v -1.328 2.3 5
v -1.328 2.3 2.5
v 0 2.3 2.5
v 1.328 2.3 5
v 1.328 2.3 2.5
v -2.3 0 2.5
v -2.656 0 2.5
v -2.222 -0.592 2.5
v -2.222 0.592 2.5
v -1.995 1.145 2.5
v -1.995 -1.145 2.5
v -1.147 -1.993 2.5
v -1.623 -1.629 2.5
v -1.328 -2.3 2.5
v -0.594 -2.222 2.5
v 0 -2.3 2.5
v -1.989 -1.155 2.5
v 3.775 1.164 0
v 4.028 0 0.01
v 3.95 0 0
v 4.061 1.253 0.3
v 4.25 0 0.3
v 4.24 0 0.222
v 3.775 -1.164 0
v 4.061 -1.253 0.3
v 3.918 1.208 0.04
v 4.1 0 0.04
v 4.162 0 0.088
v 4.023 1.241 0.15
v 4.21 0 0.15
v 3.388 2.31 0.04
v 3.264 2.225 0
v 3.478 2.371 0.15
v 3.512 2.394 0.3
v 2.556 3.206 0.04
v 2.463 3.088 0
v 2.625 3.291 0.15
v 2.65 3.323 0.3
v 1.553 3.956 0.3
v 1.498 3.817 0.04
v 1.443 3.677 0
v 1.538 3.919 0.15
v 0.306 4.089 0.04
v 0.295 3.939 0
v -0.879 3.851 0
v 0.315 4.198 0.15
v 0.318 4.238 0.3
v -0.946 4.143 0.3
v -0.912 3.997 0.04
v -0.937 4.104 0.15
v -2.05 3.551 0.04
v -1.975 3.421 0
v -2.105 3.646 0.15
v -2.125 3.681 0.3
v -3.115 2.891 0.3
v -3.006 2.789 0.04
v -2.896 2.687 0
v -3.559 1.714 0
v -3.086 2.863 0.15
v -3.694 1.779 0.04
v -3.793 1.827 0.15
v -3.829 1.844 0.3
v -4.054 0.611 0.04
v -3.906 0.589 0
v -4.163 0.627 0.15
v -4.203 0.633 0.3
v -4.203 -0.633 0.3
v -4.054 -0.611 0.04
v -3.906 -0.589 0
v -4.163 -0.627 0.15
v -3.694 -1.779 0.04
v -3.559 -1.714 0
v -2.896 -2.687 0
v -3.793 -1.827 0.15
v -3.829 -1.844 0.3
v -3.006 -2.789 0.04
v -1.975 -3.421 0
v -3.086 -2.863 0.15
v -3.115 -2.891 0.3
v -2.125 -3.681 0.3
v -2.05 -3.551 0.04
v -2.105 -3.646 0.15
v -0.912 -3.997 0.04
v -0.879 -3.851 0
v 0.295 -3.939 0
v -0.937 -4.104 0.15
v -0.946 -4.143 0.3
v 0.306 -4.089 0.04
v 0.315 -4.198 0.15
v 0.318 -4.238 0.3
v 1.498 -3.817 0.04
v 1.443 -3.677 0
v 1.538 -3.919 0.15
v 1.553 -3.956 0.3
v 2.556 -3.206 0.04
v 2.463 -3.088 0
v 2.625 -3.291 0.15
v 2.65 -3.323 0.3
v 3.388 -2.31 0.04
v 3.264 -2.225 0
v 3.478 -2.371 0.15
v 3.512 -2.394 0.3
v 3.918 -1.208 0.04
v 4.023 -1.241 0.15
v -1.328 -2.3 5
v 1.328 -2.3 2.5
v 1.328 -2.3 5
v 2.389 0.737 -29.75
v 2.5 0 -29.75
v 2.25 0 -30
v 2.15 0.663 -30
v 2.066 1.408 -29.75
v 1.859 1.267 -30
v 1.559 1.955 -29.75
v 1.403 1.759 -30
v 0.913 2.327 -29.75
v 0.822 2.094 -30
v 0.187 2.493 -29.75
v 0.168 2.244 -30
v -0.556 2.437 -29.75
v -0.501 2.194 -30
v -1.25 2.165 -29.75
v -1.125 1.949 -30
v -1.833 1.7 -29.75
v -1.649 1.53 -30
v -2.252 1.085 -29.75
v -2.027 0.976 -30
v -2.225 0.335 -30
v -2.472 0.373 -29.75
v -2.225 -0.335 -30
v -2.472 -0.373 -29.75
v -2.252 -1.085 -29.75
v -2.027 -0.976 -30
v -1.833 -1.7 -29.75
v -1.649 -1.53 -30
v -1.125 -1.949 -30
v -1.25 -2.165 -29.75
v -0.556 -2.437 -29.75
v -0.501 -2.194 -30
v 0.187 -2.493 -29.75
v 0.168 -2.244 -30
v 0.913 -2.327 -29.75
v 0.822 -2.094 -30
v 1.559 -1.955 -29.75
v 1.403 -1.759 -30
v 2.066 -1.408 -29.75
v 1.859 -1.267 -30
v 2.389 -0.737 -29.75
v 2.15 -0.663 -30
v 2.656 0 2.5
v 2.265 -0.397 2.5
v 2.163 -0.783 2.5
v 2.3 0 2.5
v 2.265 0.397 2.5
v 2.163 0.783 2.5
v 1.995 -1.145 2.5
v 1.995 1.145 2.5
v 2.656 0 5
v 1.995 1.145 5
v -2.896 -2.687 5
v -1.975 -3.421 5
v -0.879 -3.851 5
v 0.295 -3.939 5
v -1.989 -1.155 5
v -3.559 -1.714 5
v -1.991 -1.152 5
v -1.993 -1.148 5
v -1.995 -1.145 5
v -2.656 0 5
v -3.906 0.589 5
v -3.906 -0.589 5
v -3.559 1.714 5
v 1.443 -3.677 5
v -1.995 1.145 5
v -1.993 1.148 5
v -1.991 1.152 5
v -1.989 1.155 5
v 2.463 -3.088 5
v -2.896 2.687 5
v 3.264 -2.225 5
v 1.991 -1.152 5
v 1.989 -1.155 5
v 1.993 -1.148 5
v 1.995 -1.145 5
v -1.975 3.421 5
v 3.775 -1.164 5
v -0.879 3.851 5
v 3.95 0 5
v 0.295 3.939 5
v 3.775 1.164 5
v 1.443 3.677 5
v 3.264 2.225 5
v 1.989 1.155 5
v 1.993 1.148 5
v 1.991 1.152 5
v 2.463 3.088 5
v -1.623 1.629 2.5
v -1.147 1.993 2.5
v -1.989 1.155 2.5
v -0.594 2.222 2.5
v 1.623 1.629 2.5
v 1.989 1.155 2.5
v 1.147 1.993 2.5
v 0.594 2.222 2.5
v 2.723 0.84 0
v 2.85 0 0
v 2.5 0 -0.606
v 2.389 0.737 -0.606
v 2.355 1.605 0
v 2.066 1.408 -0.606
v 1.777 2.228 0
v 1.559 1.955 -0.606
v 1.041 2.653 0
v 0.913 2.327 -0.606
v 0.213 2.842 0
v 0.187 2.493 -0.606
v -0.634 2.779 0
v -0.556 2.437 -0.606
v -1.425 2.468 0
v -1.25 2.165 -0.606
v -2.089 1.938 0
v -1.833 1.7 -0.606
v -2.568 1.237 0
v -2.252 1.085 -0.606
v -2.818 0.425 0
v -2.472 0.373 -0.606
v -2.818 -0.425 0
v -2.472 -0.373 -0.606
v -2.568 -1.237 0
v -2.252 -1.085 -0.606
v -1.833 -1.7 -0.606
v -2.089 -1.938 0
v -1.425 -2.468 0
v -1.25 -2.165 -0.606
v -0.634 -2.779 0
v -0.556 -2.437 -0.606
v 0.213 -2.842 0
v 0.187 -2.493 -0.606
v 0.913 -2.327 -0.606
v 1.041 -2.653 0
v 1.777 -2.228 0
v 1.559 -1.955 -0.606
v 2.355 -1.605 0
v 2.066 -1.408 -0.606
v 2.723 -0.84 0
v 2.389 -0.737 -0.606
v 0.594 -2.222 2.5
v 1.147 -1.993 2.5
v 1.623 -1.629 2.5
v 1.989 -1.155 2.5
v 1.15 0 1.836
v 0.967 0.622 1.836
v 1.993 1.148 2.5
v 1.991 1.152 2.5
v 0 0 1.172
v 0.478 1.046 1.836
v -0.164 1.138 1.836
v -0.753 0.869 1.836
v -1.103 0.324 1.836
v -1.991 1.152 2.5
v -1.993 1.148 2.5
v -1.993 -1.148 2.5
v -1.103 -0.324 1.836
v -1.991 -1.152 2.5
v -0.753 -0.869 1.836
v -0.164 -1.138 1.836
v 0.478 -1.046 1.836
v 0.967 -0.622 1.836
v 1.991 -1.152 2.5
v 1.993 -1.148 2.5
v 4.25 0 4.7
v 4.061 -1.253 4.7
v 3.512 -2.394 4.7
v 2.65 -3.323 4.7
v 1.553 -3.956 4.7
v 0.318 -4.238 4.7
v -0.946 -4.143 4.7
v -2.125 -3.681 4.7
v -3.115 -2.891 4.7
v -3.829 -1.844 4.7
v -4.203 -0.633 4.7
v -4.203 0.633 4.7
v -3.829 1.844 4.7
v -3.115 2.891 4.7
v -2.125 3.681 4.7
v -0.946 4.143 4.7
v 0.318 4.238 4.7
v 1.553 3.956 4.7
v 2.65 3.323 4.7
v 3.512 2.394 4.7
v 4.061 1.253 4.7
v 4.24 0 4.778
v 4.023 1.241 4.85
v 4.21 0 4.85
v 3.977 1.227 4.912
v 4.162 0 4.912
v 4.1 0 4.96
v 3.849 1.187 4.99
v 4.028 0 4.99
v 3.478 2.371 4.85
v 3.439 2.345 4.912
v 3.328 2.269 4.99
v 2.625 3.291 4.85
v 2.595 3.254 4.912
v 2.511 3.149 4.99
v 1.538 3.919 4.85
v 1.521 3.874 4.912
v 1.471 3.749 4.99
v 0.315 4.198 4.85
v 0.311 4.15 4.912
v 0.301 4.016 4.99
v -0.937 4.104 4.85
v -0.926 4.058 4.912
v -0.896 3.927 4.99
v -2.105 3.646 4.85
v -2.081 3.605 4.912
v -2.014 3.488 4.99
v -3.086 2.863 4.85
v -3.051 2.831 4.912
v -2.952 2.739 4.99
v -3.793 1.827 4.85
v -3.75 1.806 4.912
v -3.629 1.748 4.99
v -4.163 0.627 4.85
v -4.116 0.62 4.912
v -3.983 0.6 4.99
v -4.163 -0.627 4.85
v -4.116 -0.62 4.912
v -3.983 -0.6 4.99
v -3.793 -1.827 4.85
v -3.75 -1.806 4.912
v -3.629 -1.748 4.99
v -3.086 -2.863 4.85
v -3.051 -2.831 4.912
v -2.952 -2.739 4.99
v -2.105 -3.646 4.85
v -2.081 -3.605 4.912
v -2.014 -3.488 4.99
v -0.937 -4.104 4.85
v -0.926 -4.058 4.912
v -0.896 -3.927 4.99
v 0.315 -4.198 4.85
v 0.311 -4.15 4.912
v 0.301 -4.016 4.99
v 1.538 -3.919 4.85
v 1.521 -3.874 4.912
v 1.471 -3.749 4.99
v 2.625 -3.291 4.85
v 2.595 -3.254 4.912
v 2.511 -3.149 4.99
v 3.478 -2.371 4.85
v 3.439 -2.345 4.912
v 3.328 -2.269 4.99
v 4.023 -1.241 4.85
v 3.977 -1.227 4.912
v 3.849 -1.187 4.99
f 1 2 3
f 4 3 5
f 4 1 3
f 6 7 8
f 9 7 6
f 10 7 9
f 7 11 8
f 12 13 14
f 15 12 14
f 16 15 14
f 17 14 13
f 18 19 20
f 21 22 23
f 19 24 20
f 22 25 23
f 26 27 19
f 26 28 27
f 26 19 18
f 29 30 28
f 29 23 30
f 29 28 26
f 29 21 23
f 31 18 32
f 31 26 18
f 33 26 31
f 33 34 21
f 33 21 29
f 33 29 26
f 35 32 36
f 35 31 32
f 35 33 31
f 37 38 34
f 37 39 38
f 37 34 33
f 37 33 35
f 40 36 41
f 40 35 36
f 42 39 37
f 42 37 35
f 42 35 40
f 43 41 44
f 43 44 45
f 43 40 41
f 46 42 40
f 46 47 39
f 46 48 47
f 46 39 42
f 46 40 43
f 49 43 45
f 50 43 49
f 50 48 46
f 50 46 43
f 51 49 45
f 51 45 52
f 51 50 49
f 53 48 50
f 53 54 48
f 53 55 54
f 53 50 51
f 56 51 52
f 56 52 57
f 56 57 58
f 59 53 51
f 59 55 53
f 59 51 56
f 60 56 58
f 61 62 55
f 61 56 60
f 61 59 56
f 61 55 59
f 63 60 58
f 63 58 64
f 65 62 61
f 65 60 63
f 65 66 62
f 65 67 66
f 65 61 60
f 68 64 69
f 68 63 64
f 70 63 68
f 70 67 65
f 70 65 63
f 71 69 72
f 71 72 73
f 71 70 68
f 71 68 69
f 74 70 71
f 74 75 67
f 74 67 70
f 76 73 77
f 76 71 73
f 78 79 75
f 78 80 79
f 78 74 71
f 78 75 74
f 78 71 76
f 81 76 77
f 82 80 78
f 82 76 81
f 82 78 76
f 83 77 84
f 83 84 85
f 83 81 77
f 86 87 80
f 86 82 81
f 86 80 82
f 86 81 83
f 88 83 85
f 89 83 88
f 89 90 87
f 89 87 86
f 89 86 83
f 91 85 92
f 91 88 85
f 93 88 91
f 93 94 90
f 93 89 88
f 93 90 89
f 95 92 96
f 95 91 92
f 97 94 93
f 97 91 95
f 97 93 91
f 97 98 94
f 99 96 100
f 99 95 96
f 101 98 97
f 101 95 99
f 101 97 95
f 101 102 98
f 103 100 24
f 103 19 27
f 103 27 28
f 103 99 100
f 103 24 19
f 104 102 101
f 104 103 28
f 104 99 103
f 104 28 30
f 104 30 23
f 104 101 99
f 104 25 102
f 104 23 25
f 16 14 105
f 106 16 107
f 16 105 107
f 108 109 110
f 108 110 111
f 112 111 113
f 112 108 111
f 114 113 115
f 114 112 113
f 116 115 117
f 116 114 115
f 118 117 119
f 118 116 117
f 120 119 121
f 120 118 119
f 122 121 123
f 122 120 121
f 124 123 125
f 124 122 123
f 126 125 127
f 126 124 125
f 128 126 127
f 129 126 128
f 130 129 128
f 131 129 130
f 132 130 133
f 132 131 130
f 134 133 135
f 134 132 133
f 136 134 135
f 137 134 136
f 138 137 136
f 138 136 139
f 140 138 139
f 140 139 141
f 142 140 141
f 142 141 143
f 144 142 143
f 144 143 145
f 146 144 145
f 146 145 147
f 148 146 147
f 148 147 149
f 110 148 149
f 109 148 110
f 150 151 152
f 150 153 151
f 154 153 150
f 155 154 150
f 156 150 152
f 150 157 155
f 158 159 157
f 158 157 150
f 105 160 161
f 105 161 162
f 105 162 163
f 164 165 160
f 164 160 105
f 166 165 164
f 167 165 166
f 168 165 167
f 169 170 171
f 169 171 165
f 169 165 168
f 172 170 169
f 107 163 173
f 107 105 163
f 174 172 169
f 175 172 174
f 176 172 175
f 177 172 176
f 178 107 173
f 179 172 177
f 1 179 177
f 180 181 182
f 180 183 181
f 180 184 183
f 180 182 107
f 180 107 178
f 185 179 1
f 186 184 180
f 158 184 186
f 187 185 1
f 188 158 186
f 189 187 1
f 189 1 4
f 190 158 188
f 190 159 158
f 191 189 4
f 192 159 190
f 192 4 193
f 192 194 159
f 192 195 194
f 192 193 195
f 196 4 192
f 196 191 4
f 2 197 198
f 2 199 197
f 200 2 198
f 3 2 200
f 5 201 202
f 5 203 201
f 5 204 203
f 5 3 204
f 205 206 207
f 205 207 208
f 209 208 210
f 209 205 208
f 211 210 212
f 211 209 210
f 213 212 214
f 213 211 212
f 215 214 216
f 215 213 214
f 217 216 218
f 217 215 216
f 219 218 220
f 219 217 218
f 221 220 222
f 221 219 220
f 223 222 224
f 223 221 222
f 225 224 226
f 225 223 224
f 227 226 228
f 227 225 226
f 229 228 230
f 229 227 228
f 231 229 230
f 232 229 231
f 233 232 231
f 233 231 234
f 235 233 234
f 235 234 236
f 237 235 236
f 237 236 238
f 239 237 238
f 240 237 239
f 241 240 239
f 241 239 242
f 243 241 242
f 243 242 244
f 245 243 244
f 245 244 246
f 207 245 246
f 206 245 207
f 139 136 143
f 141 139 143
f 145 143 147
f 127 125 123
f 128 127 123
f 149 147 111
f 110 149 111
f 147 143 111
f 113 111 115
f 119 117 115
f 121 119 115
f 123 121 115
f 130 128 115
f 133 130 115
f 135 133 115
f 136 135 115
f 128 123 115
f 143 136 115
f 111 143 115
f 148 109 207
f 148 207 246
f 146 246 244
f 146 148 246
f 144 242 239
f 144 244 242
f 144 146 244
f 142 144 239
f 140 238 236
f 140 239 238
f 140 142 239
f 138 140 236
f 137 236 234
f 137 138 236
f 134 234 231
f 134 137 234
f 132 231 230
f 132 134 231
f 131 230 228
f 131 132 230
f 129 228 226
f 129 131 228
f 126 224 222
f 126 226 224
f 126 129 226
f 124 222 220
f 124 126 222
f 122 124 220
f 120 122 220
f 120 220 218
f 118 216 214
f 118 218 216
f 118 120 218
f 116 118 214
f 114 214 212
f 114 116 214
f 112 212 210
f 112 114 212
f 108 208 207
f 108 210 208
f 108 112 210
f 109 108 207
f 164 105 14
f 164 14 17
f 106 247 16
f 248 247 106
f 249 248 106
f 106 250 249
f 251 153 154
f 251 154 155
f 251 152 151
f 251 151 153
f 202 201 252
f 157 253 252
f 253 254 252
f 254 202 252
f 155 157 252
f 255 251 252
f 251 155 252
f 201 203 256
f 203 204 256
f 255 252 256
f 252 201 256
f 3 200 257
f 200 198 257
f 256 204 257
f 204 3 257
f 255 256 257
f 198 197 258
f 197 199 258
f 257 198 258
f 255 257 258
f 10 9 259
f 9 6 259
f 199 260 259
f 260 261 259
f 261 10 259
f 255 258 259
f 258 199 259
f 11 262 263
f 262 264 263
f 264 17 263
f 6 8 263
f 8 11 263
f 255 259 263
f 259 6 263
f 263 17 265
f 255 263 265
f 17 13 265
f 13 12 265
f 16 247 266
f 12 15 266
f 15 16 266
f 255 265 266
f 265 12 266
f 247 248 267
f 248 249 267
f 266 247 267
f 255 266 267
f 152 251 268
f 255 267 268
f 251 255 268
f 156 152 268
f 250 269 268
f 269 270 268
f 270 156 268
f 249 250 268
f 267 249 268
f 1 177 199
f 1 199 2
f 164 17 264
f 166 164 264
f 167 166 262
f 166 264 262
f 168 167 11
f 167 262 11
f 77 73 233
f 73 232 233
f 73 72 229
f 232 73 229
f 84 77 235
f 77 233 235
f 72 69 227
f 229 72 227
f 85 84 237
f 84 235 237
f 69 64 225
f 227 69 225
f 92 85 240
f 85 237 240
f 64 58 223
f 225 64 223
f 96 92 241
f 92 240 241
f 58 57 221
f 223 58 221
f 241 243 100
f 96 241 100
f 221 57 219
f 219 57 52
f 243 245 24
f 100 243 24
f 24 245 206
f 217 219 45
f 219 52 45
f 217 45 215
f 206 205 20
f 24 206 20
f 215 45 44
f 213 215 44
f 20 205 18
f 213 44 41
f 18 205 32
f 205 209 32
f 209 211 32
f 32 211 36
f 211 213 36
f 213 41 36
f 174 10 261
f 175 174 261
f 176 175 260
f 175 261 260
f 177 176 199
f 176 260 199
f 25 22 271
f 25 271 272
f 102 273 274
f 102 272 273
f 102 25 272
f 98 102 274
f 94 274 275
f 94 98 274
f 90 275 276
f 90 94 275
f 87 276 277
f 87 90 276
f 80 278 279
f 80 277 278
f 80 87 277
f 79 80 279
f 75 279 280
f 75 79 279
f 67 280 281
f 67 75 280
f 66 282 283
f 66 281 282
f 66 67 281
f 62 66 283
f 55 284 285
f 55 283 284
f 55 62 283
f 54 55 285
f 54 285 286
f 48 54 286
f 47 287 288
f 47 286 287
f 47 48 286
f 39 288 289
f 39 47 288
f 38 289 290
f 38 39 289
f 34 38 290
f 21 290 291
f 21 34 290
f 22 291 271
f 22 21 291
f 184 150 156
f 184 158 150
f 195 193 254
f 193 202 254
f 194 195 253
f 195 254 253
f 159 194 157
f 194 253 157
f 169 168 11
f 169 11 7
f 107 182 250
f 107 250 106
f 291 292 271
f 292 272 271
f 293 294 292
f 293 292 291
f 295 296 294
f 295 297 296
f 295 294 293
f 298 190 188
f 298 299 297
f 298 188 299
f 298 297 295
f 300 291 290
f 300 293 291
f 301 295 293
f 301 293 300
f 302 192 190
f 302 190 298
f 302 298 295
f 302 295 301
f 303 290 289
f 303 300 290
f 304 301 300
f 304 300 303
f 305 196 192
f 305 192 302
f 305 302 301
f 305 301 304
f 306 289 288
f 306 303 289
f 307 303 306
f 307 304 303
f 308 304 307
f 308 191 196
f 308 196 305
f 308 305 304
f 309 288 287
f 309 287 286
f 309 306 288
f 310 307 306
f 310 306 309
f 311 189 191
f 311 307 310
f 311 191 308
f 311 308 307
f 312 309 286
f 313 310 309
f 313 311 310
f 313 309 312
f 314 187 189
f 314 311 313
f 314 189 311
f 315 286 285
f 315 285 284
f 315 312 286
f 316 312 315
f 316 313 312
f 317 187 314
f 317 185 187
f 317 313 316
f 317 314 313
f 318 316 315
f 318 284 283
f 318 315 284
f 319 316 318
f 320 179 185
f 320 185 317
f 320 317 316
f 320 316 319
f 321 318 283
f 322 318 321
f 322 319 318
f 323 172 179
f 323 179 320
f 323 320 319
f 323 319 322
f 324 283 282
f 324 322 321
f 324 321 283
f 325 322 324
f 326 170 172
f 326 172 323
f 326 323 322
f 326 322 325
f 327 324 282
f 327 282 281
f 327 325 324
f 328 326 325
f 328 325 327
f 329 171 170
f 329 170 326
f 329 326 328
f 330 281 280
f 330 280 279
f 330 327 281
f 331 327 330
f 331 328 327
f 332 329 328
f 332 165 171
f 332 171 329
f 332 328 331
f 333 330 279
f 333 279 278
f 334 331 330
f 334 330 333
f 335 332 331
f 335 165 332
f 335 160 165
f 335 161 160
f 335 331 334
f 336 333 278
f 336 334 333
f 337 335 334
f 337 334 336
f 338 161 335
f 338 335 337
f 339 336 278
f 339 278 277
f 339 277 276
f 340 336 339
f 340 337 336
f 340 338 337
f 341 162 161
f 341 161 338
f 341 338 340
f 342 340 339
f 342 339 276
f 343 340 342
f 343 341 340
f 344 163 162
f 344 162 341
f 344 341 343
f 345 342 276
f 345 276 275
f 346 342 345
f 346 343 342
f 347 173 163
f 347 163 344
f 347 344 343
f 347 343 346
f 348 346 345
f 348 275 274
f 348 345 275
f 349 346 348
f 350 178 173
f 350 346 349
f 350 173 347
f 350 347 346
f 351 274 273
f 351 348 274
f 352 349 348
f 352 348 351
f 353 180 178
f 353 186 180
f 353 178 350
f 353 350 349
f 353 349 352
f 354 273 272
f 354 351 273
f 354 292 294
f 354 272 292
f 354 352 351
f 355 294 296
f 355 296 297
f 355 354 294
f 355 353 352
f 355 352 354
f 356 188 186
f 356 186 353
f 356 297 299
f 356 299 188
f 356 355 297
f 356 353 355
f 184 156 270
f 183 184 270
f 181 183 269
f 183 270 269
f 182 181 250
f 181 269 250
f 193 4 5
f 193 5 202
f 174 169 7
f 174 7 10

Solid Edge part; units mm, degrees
sketch "Sketch1" plane through (0, 0, 0) normal (0, -1, 0) x (1, 0, 0)
  line L0 (4.25, 5) -> (4.25, 0)
  line L1 (4.25, 0) -> (2.85, 0)
  line L2 (2.85, 0) -> (2.5, -0.6062)
  line L3 (2.5, -0.6062) -> (2.5, -30)
  line L4 (2.5, -30) -> (0, -30)
  line L5 (2.3, 2.5) -> (0, 1.1721)
  line L6 (2.3, 5) -> (2.3, 2.5)
  line L7 (4.25, 5) -> (2.3, 5)
  dimension "D1" = 2.5
  dimension "D2" = 30
  dimension "D3" = 5
revolve "RevolvedProtrusion1" add sketch "Sketch1" angle 360 about axis through (0, 0, -6) along (0, 0, 1)
cosmetic_thread "Thread1" size "M5"
chamfer "Chamfer_1" distance 0.25 angle 45 1 edges at (-2.5, 0, -30)
fillet "Round_1" radius 0.3 2 edges at (-4.25, 0, 0) (-4.25, 0, 5)
sketch "Sketch2" plane through (0, 0, 5) normal (0, 0, 1) x (0, 1, 0)
  line L0 (-2.3, 1.3279) -> (-2.3, -1.3279)
  line L1 (0, -2.6558) -> (-2.3, -1.3279)
  line L2 (2.3, -1.3279) -> (0, -2.6558)
  line L3 (2.3, 1.3279) -> (2.3, -1.3279)
  line L4 (0, 2.6558) -> (2.3, 1.3279)
  line L5 (-2.3, 1.3279) -> (0, 2.6558)
extrude "Cutout1" cut sketch "Sketch2" against normal up to vertex (2.5 mm away)
properties material "Galvanized steel"
